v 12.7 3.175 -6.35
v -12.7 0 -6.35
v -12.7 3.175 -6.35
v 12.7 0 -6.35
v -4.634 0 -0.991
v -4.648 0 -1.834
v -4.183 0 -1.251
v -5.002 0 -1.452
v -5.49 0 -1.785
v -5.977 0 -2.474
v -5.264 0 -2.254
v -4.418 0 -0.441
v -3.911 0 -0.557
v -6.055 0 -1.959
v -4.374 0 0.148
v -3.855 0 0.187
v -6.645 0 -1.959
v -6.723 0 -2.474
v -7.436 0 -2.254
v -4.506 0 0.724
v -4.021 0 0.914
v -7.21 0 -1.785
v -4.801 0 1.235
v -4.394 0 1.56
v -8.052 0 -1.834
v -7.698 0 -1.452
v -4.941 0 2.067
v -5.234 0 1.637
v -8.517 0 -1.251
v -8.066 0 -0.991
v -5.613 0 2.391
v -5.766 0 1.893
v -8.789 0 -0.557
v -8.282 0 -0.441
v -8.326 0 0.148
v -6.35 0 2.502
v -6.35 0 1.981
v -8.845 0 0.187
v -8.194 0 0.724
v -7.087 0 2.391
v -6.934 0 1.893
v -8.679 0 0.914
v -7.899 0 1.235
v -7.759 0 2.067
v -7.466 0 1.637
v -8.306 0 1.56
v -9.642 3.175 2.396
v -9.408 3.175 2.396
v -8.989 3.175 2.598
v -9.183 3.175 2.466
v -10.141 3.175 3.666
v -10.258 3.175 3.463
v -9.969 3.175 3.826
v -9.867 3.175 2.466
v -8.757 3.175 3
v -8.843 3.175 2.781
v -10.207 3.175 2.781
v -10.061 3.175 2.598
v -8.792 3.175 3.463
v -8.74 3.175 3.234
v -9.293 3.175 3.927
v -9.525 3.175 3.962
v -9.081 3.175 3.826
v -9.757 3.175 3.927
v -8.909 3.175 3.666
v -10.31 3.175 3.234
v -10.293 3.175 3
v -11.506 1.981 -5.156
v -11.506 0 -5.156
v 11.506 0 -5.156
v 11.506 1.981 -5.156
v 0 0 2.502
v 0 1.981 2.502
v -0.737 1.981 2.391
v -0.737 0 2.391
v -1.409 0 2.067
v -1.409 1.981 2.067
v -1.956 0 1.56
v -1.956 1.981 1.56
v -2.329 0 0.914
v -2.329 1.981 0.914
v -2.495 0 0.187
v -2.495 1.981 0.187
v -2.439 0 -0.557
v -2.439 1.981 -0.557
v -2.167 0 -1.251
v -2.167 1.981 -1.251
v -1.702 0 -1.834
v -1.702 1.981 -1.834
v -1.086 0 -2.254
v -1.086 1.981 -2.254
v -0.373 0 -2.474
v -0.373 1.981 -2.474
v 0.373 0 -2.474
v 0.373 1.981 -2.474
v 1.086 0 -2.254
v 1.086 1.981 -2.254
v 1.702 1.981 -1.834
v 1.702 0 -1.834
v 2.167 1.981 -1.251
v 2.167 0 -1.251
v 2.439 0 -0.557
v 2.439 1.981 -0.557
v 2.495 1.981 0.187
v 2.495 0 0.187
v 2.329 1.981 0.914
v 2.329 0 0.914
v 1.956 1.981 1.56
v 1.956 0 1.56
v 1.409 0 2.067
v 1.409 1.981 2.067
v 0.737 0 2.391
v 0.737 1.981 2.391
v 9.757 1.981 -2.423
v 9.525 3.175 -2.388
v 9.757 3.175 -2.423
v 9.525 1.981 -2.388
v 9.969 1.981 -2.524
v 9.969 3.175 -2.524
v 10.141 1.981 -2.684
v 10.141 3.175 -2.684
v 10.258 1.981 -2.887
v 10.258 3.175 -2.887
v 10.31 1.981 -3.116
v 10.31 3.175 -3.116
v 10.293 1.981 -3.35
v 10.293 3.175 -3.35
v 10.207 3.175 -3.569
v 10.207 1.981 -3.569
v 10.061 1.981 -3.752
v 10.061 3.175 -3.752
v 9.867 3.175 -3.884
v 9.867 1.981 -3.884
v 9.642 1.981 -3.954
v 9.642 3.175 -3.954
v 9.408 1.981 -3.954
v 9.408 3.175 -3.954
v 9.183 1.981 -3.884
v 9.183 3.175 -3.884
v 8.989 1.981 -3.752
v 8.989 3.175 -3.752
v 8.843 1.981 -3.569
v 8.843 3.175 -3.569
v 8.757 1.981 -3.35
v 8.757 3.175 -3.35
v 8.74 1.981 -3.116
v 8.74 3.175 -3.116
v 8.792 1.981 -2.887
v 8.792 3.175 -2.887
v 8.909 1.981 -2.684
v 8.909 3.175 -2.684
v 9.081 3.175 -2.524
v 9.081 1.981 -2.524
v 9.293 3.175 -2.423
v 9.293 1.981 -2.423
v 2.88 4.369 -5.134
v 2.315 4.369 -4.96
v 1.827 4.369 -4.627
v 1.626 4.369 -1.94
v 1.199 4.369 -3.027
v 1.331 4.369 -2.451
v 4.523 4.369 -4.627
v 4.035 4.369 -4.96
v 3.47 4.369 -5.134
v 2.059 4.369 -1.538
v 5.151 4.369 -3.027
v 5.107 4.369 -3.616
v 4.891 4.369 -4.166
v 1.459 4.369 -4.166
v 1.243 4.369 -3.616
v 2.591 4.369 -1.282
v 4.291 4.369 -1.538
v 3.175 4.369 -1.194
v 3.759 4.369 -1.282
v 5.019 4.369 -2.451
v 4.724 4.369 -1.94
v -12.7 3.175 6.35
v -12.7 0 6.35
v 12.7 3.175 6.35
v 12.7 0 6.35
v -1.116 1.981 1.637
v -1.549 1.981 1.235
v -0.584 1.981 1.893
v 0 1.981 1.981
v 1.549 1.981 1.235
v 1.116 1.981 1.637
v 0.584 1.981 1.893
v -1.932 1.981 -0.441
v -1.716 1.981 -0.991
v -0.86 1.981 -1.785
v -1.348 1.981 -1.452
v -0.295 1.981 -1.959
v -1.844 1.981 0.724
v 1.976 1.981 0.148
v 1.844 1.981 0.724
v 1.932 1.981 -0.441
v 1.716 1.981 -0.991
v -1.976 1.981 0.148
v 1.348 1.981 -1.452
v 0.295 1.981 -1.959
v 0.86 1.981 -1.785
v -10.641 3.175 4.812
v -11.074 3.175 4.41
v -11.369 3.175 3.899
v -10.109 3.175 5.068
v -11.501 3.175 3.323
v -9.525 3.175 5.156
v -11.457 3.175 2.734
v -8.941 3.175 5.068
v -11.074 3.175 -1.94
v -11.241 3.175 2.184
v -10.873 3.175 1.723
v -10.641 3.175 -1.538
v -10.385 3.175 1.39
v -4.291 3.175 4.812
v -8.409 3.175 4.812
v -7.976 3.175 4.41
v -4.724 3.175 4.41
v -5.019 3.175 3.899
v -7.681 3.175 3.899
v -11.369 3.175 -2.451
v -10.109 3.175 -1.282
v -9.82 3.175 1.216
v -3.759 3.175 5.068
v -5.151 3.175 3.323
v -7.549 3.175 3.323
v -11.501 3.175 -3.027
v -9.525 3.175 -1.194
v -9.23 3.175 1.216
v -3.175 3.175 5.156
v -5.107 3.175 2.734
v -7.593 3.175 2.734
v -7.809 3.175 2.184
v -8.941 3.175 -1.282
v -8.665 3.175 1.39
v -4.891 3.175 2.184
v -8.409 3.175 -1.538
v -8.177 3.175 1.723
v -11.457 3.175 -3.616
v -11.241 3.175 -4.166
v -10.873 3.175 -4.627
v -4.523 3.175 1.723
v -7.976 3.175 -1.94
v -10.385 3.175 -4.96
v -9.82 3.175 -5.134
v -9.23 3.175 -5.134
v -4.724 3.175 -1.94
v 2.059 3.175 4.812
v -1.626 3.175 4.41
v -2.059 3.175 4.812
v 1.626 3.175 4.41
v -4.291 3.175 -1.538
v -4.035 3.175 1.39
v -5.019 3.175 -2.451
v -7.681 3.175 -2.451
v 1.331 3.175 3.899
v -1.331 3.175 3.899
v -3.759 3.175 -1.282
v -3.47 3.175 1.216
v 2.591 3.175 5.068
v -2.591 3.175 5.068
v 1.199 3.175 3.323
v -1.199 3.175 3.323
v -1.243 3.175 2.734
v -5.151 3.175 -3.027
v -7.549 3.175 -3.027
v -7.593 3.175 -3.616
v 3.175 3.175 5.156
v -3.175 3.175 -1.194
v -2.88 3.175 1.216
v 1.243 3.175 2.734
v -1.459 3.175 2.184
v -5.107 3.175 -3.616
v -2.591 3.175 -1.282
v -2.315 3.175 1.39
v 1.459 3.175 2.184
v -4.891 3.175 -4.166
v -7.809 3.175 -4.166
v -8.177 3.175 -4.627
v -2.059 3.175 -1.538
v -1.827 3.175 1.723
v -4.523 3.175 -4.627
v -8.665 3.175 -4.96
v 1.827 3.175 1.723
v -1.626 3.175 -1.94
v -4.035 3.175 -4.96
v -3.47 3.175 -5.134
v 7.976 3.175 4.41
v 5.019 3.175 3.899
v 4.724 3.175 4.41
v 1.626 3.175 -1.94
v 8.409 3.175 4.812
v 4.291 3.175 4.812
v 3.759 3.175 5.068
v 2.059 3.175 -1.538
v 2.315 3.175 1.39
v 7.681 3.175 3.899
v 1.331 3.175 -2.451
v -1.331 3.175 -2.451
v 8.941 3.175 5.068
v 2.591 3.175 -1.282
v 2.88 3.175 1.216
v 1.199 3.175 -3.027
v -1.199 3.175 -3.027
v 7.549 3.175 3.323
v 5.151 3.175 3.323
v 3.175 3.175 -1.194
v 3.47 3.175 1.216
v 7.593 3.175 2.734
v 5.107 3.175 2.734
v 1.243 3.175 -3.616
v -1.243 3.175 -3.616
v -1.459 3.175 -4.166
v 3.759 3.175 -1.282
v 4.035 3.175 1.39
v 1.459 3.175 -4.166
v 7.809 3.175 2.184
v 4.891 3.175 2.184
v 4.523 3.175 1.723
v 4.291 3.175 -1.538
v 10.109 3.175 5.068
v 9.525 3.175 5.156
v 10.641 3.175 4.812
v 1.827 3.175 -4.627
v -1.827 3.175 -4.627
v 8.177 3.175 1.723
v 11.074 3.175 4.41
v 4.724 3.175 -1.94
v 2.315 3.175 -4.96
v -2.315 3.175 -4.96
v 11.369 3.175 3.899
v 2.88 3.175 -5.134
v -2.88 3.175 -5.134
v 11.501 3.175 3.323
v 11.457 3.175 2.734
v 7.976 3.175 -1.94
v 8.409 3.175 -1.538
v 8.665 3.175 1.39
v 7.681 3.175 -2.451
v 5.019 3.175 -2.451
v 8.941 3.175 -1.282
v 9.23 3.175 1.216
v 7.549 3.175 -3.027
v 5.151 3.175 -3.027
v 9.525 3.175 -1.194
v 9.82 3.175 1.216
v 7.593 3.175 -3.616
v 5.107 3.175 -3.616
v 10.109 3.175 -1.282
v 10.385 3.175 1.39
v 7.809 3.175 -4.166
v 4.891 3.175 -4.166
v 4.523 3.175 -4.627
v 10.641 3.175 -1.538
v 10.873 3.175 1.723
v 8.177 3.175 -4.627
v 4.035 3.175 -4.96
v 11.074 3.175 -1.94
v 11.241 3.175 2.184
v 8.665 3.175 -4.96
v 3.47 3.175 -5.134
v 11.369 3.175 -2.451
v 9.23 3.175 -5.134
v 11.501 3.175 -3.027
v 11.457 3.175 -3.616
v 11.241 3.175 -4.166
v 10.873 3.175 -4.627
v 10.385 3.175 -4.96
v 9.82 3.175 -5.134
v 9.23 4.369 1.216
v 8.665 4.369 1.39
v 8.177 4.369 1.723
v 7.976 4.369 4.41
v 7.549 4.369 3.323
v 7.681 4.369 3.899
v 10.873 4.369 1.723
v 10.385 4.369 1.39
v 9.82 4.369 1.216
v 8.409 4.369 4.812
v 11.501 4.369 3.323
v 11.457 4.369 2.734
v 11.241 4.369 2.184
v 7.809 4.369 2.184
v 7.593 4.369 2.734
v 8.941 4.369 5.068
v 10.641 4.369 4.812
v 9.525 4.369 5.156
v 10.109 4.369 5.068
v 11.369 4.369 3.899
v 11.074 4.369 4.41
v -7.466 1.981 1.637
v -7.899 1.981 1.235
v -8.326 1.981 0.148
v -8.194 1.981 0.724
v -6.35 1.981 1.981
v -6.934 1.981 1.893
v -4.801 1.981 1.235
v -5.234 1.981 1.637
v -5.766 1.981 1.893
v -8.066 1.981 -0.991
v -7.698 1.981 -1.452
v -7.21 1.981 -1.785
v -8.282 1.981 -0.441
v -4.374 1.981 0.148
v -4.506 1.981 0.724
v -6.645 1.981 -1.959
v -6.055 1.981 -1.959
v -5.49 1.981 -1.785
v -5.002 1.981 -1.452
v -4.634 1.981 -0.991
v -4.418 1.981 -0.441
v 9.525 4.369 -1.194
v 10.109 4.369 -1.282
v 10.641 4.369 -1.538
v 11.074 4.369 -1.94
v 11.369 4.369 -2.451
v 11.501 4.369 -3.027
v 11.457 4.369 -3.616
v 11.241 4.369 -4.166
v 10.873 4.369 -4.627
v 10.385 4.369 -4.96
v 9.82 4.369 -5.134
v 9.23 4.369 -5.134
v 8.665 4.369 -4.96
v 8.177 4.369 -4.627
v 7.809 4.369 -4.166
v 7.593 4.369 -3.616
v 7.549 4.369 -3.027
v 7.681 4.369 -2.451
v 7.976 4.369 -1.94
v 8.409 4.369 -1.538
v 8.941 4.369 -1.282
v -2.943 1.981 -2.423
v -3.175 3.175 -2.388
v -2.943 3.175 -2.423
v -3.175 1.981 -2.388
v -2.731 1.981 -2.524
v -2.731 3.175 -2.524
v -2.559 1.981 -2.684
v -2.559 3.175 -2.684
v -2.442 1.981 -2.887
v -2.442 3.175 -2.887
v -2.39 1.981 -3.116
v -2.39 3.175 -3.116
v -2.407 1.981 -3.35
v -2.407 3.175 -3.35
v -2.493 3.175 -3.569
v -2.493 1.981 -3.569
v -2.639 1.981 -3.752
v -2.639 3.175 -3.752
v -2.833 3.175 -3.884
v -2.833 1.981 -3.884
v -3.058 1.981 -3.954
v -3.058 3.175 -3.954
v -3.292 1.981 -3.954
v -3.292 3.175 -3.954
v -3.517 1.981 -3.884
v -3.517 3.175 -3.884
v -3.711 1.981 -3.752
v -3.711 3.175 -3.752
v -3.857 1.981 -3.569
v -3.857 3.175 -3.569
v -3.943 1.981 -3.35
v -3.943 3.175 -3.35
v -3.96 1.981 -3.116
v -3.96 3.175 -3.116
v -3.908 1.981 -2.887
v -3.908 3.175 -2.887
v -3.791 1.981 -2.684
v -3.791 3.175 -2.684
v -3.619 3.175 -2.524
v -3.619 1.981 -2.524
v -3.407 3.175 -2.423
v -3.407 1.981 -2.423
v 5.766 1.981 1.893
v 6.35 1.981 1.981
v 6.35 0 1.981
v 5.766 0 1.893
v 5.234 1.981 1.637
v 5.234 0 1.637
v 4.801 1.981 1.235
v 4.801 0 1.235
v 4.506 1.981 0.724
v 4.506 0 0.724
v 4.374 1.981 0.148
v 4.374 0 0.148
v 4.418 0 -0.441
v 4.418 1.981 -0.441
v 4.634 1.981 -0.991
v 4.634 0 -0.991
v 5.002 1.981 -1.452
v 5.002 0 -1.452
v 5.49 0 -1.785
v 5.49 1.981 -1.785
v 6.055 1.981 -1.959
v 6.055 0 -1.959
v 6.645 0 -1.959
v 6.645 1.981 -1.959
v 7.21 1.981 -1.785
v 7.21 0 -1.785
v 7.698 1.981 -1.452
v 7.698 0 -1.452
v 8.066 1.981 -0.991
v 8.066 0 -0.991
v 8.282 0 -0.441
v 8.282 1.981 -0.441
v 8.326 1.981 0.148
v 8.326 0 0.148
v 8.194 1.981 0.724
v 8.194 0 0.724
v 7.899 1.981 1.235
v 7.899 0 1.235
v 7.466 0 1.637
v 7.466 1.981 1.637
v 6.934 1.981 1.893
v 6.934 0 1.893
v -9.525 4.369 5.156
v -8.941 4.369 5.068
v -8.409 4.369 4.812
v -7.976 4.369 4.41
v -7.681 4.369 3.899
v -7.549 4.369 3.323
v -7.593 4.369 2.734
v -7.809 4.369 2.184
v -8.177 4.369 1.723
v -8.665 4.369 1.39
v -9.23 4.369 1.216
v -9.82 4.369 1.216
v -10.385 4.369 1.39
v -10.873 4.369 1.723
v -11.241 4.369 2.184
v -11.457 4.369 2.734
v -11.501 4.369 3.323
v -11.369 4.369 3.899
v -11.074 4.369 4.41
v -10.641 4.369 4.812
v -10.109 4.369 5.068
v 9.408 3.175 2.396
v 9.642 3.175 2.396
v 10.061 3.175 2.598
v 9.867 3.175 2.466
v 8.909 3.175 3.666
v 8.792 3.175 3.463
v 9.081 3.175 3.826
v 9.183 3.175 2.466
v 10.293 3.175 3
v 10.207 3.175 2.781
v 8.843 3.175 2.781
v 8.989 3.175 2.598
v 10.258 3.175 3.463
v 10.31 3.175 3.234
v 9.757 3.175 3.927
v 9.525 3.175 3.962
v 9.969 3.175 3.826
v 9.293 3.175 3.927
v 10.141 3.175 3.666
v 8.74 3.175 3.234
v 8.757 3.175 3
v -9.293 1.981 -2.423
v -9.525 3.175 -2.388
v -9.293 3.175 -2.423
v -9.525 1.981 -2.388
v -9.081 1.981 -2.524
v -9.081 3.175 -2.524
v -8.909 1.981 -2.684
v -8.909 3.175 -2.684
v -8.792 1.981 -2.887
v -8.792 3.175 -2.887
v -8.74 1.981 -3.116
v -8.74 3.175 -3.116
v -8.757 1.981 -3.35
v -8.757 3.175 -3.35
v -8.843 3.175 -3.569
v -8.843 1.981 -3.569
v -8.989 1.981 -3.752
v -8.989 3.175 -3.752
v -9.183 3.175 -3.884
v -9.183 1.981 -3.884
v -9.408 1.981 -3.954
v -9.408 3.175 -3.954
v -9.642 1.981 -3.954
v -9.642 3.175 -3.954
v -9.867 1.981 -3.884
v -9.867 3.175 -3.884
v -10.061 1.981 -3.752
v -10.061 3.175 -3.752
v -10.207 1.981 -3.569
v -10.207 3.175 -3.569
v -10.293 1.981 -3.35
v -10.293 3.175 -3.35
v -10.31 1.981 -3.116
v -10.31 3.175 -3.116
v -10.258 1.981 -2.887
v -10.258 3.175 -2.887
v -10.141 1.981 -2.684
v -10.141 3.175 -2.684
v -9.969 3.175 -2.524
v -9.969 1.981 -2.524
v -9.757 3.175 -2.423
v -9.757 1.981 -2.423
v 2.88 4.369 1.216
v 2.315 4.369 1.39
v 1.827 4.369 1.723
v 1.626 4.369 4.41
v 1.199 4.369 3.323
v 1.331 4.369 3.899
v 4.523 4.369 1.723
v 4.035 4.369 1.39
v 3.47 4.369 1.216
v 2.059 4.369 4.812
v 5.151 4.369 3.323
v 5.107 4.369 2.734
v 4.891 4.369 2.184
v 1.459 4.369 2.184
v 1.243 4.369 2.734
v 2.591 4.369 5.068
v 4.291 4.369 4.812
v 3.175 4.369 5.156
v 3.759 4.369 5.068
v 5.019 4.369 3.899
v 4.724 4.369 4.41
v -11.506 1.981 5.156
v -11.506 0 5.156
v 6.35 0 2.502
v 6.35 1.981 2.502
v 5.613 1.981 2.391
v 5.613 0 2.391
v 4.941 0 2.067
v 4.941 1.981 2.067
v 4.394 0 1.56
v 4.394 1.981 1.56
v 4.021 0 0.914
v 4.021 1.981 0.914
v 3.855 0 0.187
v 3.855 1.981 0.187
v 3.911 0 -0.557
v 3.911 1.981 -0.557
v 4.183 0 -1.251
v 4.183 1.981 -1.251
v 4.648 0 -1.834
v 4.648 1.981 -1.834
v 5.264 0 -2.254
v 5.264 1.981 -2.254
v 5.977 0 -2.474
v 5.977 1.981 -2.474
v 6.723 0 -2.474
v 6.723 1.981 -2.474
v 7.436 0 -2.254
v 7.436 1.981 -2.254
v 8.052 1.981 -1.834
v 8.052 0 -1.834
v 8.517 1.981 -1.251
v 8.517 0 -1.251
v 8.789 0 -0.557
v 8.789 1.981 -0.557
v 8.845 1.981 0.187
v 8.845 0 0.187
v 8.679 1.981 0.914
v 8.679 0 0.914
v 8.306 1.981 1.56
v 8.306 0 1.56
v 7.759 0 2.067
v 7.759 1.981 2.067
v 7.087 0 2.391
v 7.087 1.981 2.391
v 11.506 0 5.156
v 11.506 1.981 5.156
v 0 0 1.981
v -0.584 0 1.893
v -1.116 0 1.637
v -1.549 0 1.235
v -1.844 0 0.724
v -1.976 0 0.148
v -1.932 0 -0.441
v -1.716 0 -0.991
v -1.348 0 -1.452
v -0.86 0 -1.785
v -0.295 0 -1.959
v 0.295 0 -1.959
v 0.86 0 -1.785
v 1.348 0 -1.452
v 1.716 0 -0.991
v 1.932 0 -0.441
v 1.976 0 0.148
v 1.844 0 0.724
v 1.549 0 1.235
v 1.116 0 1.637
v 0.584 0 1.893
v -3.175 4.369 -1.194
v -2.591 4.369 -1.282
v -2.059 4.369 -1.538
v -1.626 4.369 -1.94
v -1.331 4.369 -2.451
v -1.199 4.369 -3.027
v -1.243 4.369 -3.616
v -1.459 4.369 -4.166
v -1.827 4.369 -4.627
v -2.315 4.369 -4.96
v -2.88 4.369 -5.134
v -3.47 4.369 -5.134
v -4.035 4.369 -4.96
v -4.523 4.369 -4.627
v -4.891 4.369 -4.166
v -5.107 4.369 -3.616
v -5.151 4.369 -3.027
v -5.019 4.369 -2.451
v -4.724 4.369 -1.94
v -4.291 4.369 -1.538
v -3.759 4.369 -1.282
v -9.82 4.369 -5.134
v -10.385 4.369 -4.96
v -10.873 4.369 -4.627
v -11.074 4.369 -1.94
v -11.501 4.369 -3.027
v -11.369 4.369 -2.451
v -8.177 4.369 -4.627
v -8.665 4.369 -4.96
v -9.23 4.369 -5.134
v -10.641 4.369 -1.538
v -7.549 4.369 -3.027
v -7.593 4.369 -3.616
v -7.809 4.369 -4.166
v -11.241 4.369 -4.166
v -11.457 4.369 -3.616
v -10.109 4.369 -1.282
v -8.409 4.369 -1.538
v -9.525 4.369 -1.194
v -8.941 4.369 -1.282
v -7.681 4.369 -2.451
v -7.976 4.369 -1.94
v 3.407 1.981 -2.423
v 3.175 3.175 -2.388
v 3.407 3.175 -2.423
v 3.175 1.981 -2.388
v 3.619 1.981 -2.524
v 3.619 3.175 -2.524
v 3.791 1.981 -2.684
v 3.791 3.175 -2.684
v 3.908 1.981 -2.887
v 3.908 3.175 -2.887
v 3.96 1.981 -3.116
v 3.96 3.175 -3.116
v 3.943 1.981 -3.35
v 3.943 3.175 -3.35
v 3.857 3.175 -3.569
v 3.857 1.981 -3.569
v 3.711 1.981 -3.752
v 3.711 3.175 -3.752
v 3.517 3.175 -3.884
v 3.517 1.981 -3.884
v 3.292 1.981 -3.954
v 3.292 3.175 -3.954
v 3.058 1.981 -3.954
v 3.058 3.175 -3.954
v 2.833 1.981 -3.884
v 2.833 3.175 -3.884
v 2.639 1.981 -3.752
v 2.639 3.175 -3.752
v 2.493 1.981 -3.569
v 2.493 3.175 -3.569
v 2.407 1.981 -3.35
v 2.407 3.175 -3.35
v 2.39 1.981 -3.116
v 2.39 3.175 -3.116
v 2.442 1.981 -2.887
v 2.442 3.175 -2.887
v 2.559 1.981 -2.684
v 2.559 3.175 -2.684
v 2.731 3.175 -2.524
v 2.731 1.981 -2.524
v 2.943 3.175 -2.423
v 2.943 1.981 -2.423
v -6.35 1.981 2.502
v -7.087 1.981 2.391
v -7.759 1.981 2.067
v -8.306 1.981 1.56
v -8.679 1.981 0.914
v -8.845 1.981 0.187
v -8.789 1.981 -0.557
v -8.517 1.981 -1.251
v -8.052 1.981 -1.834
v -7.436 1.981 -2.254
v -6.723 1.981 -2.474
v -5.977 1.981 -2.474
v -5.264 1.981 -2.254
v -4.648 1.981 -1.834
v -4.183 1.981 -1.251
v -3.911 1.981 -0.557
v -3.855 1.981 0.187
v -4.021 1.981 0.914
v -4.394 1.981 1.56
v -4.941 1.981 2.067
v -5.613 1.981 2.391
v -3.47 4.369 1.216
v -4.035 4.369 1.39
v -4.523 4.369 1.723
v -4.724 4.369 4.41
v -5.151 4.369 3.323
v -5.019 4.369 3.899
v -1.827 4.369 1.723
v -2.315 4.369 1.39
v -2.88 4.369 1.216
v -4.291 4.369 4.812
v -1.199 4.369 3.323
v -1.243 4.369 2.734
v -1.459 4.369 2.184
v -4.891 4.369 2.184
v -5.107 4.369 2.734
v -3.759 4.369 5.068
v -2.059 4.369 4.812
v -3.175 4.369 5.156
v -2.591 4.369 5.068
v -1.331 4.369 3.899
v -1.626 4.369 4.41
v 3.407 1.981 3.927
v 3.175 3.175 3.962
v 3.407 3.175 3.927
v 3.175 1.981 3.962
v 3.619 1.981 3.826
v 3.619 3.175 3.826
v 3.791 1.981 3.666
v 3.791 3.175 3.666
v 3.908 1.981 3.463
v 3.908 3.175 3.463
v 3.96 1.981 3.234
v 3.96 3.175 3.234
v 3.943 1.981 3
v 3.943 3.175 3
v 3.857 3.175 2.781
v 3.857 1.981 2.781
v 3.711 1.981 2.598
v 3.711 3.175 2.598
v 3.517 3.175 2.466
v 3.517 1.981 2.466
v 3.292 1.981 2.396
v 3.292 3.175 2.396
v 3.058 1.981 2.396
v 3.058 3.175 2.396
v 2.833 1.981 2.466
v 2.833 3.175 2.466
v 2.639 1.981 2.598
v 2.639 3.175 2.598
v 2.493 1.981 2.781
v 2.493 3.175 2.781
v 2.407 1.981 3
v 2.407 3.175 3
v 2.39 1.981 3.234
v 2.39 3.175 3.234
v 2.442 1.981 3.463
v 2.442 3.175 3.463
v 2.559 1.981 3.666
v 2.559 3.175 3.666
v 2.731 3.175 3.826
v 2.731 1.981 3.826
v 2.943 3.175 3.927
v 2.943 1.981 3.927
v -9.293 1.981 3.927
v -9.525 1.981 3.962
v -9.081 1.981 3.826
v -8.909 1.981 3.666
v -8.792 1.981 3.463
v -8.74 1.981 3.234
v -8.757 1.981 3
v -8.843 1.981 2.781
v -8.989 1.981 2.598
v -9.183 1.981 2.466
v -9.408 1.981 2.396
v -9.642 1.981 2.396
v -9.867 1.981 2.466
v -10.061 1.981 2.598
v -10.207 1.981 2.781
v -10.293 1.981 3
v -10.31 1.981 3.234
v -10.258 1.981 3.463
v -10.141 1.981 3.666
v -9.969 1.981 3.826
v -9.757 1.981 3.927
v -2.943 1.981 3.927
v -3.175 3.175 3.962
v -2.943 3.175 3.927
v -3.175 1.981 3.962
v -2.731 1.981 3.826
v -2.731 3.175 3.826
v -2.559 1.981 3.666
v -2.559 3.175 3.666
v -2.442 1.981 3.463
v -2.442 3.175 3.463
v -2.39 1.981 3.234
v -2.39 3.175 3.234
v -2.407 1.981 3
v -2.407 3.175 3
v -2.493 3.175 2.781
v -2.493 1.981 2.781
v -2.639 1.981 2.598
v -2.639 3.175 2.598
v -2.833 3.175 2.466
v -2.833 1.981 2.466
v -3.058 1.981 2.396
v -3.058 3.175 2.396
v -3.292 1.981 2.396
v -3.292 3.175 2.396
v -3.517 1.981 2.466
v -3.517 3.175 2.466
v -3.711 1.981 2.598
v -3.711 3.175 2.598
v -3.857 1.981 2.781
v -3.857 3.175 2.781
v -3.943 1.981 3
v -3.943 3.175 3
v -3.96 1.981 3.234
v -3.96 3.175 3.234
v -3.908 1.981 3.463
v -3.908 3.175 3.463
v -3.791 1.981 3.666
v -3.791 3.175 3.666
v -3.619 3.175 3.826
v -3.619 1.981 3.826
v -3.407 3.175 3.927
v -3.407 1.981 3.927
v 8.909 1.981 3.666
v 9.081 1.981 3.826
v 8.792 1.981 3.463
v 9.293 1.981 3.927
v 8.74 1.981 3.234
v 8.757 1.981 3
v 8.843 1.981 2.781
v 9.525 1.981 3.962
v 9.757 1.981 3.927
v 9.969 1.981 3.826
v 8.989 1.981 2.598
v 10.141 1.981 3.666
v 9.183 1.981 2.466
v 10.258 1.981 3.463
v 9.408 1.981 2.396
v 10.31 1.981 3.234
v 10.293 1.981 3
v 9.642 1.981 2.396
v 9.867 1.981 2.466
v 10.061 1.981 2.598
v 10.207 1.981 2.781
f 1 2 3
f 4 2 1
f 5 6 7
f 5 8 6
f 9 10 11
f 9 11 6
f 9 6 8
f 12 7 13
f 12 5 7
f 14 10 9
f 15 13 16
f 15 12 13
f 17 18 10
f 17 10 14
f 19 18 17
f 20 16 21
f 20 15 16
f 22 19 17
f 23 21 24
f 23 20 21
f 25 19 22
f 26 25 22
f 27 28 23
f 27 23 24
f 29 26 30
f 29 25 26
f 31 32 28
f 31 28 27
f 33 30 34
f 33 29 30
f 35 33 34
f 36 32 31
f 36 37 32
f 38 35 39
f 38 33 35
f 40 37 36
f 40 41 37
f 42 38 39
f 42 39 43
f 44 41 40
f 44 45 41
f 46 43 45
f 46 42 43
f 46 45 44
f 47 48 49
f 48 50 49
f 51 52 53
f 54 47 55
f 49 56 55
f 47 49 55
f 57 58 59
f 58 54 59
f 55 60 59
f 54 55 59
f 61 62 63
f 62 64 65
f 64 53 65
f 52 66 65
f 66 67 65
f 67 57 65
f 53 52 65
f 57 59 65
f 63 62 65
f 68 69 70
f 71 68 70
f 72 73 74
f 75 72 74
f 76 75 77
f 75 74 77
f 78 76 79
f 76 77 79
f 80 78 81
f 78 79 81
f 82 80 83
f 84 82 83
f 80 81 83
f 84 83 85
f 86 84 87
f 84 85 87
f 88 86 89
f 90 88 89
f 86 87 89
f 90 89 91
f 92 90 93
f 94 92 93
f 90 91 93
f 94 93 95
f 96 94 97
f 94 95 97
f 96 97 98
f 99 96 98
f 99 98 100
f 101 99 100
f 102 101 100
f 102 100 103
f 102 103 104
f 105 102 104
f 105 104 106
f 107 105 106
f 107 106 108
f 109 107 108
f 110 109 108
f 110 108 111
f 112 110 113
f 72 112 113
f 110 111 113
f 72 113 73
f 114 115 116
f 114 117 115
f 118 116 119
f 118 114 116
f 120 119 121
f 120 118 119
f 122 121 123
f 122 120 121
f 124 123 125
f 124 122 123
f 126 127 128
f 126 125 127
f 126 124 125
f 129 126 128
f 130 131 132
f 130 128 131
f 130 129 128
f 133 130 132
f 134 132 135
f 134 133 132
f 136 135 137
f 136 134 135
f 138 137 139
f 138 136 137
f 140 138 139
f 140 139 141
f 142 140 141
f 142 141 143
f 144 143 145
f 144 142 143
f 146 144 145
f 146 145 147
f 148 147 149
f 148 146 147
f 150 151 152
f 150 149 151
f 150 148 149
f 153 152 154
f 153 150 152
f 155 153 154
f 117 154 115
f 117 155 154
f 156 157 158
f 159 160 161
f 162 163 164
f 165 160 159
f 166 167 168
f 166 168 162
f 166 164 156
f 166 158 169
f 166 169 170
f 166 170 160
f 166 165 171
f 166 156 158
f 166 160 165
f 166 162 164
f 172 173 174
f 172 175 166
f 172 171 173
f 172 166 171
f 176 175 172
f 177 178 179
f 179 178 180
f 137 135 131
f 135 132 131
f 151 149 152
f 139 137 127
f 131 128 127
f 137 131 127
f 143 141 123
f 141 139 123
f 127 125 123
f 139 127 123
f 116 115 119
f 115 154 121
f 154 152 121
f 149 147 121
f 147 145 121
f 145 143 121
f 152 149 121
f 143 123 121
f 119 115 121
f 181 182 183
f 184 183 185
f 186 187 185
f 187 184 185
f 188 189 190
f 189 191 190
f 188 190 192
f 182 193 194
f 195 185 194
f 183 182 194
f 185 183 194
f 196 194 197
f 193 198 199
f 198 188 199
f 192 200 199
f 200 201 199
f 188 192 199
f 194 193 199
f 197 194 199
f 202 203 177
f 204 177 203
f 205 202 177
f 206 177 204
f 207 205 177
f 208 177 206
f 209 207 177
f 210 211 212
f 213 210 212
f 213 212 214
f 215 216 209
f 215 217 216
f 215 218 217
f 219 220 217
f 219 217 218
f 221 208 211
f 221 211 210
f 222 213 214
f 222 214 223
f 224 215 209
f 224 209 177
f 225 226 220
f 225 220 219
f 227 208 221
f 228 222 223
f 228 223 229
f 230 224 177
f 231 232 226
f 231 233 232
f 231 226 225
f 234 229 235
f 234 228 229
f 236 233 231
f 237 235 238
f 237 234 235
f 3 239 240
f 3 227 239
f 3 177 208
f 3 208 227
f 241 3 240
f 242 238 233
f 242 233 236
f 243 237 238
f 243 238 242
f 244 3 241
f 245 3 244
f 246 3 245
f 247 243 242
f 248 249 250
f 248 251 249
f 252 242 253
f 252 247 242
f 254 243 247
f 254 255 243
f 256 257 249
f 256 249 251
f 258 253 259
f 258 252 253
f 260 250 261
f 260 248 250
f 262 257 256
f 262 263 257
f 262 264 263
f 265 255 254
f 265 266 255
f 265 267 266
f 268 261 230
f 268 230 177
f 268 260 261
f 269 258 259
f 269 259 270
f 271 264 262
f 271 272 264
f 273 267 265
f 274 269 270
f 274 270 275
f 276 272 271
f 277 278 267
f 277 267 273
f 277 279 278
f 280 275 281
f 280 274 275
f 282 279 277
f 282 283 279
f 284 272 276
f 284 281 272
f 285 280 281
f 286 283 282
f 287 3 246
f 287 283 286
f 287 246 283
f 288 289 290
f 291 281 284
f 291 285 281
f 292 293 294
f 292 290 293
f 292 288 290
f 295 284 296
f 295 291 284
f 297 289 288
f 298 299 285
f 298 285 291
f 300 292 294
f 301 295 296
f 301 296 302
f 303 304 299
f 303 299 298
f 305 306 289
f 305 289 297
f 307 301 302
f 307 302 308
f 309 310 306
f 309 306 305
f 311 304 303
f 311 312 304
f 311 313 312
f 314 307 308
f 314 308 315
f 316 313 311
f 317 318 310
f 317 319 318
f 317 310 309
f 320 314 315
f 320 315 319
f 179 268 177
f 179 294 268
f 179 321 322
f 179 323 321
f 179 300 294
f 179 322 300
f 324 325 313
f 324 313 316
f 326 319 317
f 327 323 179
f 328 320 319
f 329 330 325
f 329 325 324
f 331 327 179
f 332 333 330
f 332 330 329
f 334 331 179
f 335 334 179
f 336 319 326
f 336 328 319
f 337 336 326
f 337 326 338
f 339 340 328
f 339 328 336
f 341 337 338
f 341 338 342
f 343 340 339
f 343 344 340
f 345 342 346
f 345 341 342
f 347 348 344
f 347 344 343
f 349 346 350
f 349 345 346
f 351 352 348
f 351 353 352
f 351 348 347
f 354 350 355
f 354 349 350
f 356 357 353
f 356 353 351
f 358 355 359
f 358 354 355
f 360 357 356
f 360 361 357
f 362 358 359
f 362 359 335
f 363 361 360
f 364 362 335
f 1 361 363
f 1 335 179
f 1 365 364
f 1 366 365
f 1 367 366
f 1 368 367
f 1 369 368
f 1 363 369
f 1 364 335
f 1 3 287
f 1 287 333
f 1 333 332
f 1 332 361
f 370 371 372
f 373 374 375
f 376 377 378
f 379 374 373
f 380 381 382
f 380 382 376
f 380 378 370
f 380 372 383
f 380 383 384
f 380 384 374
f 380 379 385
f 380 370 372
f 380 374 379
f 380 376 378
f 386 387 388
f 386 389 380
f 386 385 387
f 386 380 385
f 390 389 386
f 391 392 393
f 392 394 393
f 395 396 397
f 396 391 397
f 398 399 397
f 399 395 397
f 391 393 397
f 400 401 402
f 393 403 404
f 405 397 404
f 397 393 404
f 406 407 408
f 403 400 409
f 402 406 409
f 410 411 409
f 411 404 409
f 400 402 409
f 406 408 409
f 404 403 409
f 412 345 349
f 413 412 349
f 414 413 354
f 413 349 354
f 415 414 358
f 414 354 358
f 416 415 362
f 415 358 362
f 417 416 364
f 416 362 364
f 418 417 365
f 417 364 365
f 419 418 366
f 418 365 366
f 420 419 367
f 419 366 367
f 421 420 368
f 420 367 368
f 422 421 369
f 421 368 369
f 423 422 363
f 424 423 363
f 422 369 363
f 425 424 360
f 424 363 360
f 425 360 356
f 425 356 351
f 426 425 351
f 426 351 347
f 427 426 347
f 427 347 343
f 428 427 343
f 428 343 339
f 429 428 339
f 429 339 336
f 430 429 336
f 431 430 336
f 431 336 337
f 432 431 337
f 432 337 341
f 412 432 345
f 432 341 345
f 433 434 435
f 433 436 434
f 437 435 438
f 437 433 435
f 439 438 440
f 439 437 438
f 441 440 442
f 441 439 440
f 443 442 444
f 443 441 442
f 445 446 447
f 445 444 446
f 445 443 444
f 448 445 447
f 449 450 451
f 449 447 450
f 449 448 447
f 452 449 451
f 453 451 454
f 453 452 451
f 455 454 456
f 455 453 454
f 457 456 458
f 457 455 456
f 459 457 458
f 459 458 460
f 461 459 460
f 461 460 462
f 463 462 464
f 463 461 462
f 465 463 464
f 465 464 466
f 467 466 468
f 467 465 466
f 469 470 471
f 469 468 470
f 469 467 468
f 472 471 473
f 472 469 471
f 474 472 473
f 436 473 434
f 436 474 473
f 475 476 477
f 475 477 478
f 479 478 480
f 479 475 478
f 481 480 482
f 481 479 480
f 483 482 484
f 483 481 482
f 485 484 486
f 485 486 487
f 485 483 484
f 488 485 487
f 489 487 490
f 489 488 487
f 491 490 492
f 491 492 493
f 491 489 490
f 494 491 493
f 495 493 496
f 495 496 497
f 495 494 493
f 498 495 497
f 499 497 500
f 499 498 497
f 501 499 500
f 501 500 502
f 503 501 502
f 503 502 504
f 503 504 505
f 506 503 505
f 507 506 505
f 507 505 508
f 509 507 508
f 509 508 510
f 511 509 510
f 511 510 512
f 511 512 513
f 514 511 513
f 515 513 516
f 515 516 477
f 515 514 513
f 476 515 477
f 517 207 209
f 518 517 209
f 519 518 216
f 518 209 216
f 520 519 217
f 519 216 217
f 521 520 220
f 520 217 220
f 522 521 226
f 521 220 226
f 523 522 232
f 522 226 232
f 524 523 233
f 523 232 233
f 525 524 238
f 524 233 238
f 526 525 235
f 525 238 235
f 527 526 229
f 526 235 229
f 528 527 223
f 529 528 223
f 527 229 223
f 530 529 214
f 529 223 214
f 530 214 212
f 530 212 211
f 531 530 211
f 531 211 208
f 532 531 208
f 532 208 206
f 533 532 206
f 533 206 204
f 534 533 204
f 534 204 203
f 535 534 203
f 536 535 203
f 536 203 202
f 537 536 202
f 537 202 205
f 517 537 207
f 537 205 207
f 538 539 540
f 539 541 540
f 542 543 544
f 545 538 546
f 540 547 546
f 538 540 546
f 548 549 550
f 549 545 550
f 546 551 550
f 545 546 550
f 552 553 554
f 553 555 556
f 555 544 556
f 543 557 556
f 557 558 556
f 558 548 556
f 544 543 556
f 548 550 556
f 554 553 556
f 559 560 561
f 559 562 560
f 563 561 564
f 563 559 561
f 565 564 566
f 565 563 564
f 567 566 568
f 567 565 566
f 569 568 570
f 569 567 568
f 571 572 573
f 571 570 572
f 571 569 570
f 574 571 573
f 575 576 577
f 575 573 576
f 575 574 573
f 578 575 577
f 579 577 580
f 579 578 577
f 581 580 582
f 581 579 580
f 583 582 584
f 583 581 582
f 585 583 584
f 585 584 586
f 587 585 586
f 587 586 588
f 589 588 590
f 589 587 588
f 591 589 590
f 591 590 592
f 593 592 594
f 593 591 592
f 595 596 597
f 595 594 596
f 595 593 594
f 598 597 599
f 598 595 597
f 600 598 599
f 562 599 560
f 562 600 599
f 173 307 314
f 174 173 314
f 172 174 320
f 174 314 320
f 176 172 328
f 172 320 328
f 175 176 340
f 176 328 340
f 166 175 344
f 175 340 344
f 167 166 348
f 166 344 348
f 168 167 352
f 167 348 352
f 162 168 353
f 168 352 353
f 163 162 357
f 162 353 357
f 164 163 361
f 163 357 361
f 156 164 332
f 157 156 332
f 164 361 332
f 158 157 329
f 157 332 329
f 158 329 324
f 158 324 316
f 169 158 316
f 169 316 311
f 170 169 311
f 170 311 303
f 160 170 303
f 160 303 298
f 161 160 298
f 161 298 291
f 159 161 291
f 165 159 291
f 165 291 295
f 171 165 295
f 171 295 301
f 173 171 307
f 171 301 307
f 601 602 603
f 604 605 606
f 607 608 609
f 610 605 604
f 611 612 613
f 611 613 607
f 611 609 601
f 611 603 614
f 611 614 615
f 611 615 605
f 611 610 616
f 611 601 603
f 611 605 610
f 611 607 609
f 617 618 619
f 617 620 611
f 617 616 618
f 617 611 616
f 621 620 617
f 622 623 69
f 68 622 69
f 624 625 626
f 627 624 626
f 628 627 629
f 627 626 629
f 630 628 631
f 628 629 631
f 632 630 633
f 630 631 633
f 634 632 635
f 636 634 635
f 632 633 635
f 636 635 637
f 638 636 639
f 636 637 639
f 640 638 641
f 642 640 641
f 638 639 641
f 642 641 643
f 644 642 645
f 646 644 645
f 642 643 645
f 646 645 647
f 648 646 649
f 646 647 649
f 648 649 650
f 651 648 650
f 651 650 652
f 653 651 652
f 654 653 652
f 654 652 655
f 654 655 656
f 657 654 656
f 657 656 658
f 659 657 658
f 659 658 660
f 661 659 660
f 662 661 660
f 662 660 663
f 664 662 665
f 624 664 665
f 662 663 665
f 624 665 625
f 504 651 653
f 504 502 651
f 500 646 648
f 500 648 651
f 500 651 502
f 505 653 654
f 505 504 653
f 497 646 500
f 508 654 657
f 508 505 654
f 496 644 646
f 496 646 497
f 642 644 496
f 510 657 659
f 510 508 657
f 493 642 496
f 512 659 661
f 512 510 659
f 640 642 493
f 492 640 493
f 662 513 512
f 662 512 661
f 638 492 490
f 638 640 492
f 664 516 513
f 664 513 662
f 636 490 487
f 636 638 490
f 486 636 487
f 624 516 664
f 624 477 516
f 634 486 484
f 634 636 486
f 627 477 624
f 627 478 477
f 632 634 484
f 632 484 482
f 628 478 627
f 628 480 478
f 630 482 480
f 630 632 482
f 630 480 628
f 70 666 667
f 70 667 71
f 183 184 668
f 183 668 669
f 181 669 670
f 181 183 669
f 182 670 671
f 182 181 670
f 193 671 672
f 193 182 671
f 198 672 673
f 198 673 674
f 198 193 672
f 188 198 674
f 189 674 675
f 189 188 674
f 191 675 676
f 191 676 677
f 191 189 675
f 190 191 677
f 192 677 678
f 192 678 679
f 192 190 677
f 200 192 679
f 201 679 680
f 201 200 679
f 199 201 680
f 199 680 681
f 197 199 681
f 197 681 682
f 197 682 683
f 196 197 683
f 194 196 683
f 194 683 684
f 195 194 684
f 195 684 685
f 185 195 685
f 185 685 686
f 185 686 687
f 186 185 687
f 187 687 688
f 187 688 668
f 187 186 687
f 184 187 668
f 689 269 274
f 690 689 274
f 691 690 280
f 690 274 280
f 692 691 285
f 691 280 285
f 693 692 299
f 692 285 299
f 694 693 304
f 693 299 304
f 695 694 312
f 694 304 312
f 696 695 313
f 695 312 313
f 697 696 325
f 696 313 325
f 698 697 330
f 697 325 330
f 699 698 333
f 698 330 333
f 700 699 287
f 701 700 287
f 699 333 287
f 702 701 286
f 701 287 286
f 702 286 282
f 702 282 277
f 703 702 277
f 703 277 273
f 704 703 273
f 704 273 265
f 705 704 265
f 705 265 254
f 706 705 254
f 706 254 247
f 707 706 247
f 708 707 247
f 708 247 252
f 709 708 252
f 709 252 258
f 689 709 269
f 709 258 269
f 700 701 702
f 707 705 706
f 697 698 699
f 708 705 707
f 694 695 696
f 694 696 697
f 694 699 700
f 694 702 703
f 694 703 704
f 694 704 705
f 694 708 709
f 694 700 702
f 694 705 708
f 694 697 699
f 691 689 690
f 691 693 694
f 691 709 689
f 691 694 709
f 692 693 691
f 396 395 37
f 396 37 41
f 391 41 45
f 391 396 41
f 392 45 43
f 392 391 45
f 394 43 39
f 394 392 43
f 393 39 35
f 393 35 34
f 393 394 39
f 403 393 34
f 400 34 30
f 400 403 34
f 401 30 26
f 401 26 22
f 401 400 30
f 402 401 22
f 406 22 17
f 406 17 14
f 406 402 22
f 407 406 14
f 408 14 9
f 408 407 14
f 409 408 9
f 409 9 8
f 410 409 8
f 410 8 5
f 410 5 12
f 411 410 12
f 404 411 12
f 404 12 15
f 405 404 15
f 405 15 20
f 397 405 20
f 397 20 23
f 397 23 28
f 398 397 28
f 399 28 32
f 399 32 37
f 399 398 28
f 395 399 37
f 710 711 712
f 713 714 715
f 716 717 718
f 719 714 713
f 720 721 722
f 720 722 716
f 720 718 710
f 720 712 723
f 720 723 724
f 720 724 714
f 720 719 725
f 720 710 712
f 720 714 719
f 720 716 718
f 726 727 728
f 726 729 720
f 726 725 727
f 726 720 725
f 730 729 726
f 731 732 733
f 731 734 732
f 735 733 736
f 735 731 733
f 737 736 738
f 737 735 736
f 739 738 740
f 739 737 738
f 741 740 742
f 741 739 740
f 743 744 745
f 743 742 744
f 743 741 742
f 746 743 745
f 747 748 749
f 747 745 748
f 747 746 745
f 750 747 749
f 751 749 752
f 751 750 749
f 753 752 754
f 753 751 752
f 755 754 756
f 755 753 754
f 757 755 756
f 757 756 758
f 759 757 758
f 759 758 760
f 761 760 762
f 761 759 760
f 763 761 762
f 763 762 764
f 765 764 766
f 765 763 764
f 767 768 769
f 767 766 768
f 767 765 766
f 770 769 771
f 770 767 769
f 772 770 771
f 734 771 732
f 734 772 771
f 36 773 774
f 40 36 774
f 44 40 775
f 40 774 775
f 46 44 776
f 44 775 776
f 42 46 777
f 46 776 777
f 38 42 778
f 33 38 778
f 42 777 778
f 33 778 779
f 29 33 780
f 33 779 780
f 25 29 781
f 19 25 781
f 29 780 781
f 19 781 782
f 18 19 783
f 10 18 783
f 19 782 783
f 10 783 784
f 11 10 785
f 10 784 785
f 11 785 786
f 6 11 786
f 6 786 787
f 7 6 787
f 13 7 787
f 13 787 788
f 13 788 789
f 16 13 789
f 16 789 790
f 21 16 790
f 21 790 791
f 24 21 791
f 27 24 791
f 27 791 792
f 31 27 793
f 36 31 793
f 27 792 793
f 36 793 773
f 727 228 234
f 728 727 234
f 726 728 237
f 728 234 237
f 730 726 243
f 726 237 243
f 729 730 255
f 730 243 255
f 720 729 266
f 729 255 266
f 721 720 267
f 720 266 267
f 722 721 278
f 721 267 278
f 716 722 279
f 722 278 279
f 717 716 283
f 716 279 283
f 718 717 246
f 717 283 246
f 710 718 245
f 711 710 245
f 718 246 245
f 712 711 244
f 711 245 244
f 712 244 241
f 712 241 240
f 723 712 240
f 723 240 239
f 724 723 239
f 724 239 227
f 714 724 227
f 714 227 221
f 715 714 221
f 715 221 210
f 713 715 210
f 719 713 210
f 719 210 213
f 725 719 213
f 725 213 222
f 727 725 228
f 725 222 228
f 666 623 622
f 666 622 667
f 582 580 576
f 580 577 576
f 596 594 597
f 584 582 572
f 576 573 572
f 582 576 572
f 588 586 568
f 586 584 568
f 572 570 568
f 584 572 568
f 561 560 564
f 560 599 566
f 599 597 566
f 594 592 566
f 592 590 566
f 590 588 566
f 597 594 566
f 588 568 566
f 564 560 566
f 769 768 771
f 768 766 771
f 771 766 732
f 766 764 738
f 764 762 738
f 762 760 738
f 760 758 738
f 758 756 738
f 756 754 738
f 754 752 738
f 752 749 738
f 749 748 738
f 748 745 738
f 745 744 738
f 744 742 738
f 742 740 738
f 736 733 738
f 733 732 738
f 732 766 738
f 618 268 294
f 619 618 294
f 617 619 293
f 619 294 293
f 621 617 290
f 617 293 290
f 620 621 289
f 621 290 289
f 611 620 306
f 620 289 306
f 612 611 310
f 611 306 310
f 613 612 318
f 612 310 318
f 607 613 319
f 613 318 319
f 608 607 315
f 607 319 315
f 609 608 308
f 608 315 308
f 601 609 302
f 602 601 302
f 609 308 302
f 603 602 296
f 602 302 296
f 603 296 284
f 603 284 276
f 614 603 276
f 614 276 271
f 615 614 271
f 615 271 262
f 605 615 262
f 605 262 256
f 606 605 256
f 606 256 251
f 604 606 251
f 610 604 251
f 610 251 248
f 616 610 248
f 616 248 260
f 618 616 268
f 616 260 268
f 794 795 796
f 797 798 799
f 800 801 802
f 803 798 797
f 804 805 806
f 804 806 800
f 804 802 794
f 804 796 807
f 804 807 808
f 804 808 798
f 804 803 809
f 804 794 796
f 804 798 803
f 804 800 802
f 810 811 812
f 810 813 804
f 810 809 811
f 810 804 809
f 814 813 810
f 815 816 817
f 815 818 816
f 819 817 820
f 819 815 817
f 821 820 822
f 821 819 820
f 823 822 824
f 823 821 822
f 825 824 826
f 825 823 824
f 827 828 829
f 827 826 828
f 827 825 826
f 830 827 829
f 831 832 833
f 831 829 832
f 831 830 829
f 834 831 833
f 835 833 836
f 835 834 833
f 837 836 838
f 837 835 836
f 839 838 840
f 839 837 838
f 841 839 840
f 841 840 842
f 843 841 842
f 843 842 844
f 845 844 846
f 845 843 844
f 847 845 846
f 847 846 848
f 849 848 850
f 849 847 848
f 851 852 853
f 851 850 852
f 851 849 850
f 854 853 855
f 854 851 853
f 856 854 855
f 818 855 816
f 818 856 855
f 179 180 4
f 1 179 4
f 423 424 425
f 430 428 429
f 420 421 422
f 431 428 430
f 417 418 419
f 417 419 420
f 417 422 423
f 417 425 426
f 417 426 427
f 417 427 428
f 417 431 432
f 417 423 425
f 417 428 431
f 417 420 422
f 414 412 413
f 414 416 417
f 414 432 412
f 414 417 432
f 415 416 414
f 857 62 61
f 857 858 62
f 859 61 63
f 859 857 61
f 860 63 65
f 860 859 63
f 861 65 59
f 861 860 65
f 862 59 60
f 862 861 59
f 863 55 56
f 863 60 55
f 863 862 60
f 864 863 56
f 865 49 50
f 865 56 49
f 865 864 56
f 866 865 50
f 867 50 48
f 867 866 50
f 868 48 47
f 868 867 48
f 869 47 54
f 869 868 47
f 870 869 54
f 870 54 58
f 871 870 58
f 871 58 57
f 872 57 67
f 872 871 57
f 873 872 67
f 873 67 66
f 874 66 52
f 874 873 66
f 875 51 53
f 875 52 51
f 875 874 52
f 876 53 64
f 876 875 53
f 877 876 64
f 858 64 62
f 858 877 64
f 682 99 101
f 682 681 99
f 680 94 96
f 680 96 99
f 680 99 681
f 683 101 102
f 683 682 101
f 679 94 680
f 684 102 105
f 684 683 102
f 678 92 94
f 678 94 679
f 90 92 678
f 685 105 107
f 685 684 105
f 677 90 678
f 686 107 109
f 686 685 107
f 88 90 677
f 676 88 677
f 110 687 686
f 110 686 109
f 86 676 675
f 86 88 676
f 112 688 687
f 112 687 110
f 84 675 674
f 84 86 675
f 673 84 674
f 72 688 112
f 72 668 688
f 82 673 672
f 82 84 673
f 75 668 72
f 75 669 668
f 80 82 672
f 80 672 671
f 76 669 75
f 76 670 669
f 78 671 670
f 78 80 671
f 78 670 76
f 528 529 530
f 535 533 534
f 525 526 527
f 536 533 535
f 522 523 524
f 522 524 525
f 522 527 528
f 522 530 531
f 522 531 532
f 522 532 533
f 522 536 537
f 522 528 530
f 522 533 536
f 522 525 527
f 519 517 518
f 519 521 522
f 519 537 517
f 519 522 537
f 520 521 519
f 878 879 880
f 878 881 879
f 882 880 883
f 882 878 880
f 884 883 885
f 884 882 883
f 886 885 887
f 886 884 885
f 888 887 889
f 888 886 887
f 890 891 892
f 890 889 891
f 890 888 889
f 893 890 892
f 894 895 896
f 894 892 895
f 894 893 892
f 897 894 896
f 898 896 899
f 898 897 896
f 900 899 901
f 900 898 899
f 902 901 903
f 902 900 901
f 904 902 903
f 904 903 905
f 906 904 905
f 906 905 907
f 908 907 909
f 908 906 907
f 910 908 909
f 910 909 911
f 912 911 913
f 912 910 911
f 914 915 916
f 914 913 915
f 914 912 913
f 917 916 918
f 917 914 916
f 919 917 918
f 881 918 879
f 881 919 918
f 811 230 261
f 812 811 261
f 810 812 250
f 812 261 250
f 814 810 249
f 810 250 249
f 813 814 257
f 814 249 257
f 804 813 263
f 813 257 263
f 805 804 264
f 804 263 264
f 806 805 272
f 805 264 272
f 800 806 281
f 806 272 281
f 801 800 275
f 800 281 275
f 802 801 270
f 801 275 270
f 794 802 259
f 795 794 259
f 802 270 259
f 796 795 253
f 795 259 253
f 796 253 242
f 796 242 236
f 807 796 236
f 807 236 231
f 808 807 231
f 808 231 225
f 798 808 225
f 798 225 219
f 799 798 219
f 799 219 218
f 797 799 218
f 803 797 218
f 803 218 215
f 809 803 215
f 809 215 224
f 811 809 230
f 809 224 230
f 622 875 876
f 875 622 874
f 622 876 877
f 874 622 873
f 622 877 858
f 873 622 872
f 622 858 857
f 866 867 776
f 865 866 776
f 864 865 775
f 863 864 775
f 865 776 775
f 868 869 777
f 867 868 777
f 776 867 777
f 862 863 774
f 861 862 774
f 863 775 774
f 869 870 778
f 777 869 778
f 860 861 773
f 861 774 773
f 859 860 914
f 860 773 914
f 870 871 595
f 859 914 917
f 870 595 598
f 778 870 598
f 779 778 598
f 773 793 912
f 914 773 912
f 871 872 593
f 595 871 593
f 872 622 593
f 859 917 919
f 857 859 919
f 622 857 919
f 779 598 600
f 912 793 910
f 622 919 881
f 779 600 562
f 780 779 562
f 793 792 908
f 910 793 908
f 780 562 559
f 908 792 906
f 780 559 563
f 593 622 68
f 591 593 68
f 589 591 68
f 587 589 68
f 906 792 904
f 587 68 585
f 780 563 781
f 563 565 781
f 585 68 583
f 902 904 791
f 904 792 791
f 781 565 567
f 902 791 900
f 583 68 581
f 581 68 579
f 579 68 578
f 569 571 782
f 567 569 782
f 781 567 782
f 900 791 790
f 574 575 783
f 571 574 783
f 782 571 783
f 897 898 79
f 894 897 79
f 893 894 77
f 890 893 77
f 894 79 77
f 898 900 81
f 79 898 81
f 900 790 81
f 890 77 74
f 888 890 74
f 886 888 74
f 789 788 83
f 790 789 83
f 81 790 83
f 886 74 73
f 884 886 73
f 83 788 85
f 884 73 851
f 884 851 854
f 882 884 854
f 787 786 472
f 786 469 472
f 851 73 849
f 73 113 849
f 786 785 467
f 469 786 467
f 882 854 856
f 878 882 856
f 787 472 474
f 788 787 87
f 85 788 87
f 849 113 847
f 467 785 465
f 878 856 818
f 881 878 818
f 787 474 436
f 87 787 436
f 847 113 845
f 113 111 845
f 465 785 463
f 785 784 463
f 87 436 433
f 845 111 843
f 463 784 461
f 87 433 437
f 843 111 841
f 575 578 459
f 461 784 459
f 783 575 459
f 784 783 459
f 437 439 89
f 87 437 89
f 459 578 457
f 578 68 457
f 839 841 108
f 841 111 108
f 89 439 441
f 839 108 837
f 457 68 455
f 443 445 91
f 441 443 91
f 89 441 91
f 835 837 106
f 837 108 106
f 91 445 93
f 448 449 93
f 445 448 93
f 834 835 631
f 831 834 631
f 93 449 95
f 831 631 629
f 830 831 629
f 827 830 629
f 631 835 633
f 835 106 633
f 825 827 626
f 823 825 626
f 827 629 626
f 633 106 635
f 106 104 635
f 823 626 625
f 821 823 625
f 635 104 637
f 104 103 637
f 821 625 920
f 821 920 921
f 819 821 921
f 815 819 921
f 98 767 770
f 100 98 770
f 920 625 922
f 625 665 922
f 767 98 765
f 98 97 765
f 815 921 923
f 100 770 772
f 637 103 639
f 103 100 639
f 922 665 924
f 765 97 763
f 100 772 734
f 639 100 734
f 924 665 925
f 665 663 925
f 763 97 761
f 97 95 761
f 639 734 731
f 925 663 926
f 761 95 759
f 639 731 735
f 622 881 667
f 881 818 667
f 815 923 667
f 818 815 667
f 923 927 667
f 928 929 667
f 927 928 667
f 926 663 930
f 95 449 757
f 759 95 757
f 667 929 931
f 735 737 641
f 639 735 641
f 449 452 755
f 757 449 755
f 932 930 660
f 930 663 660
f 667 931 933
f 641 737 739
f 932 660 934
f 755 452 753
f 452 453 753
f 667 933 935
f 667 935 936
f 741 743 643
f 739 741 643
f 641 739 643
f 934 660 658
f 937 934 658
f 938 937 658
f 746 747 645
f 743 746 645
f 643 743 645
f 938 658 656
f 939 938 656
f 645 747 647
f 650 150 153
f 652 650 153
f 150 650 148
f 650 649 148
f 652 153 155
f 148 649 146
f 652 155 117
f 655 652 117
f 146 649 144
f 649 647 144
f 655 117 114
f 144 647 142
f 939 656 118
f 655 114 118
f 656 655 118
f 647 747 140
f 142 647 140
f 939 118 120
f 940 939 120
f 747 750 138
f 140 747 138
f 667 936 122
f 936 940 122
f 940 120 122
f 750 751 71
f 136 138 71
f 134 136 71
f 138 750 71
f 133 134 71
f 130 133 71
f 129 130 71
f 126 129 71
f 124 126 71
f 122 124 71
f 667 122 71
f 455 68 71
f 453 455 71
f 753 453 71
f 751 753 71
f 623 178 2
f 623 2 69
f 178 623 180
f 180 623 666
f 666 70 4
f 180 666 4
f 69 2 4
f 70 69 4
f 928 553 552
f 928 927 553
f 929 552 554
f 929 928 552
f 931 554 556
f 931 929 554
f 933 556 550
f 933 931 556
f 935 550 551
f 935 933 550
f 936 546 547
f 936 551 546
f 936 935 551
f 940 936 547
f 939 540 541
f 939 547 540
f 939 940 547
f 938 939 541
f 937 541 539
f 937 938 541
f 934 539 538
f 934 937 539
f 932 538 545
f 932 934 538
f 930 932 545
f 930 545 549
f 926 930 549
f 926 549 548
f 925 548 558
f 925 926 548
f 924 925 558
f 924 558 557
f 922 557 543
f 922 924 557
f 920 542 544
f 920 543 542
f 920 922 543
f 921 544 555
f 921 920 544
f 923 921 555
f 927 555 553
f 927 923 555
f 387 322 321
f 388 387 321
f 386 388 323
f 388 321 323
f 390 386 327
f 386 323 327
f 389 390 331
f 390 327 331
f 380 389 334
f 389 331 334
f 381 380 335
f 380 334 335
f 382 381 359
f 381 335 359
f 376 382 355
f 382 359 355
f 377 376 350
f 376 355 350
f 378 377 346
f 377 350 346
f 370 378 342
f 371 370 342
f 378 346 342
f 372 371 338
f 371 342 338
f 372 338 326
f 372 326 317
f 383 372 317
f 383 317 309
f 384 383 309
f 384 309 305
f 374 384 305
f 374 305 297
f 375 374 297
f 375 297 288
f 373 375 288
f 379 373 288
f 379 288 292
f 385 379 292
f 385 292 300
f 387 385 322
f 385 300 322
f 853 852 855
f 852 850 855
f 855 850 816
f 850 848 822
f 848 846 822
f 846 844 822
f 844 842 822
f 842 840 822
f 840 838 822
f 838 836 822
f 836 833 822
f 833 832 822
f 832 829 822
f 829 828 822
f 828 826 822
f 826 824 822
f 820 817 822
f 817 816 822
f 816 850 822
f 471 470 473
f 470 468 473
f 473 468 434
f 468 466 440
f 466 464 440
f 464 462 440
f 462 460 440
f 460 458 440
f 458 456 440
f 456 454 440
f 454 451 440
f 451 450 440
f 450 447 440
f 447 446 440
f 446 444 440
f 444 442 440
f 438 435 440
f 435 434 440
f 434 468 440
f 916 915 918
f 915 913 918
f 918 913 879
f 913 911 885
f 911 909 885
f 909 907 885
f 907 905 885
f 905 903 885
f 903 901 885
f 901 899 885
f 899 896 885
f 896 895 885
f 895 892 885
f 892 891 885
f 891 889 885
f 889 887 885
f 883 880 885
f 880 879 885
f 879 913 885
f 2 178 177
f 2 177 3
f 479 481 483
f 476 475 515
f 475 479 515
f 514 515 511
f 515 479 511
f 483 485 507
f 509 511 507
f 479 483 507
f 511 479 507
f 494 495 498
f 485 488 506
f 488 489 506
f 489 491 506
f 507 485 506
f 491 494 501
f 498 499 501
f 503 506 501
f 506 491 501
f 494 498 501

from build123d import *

# Parameters (mm, degrees)
SKETCH1_W            = 25.4
SKETCH1_H            = 12.7
BOSS_EXTRUDE1_DEPTH  = 3.175
SKETCH2_R            = 1.9812
BOSS_EXTRUDE2_DEPTH  = 1.1938
LPATTERN1_COUNT      = 4
LPATTERN1_PITCH      = 6.35
LPATTERN1_COUNT_DIR2 = 2
LPATTERN1_PITCH_DIR2 = 6.35
SHELL2_T             = -1.1938
SKETCH3_R            = 2.5019
SKETCH3_R_2          = 1.9812
BOSS_EXTRUDE3_DEPTH  = 1.9812
LPATTERN2_COUNT      = 3
LPATTERN2_PITCH      = 6.35


with BuildPart() as part:
    # Sketch1 → Boss-Extrude1 (new body)
    with BuildSketch(Plane(origin=(0, 0, 0), x_dir=(1, 0, 0), z_dir=(0, 1, 0))):
        Rectangle(SKETCH1_W, SKETCH1_H)
    extrude(amount=BOSS_EXTRUDE1_DEPTH)

    # Sketch2 → Boss-Extrude2 (add)
    with BuildSketch(Plane(origin=(0, 3.175, 0), x_dir=(1, 0, 0), z_dir=(0, 1, 0))):
        with Locations(Location((-9.525, 3.175, 0), (0, 0, 270))):
            Circle(SKETCH2_R)
    boss_extrude2 = extrude(amount=BOSS_EXTRUDE2_DEPTH)

    # LPattern1: Boss-Extrude2 4 × 2
    with Locations(*[(i * LPATTERN1_PITCH, 0, j * LPATTERN1_PITCH_DIR2) for i in range(LPATTERN1_COUNT) for j in range(LPATTERN1_COUNT_DIR2) if (i, j) != (0, 0)]):
        add(boss_extrude2)

    # Shell2
    shell2_openings = [part.faces().sort_by_distance(p)[0] for p in [
        (0, 0, 0),
    ]]
    offset(amount=SHELL2_T, openings=shell2_openings, kind=Kind.INTERSECTION)

    # Sketch3 → Boss-Extrude3 (add)
    with BuildSketch(Plane.XZ.offset(-1.9812)):
        with Locations(Location((6.35, 0, 0), (0, 0, 90))):
            Circle(SKETCH3_R)
        with Locations(Location((6.35, 0, 0), (0, 0, 90))):
            Circle(SKETCH3_R_2, mode=Mode.SUBTRACT)
    boss_extrude3 = extrude(amount=BOSS_EXTRUDE3_DEPTH)

    # LPattern2: Boss-Extrude3 ×3
    with Locations(*[(-i * LPATTERN2_PITCH, 0, 0) for i in range(1, LPATTERN2_COUNT)]):
        add(boss_extrude3)


solid = part.part
